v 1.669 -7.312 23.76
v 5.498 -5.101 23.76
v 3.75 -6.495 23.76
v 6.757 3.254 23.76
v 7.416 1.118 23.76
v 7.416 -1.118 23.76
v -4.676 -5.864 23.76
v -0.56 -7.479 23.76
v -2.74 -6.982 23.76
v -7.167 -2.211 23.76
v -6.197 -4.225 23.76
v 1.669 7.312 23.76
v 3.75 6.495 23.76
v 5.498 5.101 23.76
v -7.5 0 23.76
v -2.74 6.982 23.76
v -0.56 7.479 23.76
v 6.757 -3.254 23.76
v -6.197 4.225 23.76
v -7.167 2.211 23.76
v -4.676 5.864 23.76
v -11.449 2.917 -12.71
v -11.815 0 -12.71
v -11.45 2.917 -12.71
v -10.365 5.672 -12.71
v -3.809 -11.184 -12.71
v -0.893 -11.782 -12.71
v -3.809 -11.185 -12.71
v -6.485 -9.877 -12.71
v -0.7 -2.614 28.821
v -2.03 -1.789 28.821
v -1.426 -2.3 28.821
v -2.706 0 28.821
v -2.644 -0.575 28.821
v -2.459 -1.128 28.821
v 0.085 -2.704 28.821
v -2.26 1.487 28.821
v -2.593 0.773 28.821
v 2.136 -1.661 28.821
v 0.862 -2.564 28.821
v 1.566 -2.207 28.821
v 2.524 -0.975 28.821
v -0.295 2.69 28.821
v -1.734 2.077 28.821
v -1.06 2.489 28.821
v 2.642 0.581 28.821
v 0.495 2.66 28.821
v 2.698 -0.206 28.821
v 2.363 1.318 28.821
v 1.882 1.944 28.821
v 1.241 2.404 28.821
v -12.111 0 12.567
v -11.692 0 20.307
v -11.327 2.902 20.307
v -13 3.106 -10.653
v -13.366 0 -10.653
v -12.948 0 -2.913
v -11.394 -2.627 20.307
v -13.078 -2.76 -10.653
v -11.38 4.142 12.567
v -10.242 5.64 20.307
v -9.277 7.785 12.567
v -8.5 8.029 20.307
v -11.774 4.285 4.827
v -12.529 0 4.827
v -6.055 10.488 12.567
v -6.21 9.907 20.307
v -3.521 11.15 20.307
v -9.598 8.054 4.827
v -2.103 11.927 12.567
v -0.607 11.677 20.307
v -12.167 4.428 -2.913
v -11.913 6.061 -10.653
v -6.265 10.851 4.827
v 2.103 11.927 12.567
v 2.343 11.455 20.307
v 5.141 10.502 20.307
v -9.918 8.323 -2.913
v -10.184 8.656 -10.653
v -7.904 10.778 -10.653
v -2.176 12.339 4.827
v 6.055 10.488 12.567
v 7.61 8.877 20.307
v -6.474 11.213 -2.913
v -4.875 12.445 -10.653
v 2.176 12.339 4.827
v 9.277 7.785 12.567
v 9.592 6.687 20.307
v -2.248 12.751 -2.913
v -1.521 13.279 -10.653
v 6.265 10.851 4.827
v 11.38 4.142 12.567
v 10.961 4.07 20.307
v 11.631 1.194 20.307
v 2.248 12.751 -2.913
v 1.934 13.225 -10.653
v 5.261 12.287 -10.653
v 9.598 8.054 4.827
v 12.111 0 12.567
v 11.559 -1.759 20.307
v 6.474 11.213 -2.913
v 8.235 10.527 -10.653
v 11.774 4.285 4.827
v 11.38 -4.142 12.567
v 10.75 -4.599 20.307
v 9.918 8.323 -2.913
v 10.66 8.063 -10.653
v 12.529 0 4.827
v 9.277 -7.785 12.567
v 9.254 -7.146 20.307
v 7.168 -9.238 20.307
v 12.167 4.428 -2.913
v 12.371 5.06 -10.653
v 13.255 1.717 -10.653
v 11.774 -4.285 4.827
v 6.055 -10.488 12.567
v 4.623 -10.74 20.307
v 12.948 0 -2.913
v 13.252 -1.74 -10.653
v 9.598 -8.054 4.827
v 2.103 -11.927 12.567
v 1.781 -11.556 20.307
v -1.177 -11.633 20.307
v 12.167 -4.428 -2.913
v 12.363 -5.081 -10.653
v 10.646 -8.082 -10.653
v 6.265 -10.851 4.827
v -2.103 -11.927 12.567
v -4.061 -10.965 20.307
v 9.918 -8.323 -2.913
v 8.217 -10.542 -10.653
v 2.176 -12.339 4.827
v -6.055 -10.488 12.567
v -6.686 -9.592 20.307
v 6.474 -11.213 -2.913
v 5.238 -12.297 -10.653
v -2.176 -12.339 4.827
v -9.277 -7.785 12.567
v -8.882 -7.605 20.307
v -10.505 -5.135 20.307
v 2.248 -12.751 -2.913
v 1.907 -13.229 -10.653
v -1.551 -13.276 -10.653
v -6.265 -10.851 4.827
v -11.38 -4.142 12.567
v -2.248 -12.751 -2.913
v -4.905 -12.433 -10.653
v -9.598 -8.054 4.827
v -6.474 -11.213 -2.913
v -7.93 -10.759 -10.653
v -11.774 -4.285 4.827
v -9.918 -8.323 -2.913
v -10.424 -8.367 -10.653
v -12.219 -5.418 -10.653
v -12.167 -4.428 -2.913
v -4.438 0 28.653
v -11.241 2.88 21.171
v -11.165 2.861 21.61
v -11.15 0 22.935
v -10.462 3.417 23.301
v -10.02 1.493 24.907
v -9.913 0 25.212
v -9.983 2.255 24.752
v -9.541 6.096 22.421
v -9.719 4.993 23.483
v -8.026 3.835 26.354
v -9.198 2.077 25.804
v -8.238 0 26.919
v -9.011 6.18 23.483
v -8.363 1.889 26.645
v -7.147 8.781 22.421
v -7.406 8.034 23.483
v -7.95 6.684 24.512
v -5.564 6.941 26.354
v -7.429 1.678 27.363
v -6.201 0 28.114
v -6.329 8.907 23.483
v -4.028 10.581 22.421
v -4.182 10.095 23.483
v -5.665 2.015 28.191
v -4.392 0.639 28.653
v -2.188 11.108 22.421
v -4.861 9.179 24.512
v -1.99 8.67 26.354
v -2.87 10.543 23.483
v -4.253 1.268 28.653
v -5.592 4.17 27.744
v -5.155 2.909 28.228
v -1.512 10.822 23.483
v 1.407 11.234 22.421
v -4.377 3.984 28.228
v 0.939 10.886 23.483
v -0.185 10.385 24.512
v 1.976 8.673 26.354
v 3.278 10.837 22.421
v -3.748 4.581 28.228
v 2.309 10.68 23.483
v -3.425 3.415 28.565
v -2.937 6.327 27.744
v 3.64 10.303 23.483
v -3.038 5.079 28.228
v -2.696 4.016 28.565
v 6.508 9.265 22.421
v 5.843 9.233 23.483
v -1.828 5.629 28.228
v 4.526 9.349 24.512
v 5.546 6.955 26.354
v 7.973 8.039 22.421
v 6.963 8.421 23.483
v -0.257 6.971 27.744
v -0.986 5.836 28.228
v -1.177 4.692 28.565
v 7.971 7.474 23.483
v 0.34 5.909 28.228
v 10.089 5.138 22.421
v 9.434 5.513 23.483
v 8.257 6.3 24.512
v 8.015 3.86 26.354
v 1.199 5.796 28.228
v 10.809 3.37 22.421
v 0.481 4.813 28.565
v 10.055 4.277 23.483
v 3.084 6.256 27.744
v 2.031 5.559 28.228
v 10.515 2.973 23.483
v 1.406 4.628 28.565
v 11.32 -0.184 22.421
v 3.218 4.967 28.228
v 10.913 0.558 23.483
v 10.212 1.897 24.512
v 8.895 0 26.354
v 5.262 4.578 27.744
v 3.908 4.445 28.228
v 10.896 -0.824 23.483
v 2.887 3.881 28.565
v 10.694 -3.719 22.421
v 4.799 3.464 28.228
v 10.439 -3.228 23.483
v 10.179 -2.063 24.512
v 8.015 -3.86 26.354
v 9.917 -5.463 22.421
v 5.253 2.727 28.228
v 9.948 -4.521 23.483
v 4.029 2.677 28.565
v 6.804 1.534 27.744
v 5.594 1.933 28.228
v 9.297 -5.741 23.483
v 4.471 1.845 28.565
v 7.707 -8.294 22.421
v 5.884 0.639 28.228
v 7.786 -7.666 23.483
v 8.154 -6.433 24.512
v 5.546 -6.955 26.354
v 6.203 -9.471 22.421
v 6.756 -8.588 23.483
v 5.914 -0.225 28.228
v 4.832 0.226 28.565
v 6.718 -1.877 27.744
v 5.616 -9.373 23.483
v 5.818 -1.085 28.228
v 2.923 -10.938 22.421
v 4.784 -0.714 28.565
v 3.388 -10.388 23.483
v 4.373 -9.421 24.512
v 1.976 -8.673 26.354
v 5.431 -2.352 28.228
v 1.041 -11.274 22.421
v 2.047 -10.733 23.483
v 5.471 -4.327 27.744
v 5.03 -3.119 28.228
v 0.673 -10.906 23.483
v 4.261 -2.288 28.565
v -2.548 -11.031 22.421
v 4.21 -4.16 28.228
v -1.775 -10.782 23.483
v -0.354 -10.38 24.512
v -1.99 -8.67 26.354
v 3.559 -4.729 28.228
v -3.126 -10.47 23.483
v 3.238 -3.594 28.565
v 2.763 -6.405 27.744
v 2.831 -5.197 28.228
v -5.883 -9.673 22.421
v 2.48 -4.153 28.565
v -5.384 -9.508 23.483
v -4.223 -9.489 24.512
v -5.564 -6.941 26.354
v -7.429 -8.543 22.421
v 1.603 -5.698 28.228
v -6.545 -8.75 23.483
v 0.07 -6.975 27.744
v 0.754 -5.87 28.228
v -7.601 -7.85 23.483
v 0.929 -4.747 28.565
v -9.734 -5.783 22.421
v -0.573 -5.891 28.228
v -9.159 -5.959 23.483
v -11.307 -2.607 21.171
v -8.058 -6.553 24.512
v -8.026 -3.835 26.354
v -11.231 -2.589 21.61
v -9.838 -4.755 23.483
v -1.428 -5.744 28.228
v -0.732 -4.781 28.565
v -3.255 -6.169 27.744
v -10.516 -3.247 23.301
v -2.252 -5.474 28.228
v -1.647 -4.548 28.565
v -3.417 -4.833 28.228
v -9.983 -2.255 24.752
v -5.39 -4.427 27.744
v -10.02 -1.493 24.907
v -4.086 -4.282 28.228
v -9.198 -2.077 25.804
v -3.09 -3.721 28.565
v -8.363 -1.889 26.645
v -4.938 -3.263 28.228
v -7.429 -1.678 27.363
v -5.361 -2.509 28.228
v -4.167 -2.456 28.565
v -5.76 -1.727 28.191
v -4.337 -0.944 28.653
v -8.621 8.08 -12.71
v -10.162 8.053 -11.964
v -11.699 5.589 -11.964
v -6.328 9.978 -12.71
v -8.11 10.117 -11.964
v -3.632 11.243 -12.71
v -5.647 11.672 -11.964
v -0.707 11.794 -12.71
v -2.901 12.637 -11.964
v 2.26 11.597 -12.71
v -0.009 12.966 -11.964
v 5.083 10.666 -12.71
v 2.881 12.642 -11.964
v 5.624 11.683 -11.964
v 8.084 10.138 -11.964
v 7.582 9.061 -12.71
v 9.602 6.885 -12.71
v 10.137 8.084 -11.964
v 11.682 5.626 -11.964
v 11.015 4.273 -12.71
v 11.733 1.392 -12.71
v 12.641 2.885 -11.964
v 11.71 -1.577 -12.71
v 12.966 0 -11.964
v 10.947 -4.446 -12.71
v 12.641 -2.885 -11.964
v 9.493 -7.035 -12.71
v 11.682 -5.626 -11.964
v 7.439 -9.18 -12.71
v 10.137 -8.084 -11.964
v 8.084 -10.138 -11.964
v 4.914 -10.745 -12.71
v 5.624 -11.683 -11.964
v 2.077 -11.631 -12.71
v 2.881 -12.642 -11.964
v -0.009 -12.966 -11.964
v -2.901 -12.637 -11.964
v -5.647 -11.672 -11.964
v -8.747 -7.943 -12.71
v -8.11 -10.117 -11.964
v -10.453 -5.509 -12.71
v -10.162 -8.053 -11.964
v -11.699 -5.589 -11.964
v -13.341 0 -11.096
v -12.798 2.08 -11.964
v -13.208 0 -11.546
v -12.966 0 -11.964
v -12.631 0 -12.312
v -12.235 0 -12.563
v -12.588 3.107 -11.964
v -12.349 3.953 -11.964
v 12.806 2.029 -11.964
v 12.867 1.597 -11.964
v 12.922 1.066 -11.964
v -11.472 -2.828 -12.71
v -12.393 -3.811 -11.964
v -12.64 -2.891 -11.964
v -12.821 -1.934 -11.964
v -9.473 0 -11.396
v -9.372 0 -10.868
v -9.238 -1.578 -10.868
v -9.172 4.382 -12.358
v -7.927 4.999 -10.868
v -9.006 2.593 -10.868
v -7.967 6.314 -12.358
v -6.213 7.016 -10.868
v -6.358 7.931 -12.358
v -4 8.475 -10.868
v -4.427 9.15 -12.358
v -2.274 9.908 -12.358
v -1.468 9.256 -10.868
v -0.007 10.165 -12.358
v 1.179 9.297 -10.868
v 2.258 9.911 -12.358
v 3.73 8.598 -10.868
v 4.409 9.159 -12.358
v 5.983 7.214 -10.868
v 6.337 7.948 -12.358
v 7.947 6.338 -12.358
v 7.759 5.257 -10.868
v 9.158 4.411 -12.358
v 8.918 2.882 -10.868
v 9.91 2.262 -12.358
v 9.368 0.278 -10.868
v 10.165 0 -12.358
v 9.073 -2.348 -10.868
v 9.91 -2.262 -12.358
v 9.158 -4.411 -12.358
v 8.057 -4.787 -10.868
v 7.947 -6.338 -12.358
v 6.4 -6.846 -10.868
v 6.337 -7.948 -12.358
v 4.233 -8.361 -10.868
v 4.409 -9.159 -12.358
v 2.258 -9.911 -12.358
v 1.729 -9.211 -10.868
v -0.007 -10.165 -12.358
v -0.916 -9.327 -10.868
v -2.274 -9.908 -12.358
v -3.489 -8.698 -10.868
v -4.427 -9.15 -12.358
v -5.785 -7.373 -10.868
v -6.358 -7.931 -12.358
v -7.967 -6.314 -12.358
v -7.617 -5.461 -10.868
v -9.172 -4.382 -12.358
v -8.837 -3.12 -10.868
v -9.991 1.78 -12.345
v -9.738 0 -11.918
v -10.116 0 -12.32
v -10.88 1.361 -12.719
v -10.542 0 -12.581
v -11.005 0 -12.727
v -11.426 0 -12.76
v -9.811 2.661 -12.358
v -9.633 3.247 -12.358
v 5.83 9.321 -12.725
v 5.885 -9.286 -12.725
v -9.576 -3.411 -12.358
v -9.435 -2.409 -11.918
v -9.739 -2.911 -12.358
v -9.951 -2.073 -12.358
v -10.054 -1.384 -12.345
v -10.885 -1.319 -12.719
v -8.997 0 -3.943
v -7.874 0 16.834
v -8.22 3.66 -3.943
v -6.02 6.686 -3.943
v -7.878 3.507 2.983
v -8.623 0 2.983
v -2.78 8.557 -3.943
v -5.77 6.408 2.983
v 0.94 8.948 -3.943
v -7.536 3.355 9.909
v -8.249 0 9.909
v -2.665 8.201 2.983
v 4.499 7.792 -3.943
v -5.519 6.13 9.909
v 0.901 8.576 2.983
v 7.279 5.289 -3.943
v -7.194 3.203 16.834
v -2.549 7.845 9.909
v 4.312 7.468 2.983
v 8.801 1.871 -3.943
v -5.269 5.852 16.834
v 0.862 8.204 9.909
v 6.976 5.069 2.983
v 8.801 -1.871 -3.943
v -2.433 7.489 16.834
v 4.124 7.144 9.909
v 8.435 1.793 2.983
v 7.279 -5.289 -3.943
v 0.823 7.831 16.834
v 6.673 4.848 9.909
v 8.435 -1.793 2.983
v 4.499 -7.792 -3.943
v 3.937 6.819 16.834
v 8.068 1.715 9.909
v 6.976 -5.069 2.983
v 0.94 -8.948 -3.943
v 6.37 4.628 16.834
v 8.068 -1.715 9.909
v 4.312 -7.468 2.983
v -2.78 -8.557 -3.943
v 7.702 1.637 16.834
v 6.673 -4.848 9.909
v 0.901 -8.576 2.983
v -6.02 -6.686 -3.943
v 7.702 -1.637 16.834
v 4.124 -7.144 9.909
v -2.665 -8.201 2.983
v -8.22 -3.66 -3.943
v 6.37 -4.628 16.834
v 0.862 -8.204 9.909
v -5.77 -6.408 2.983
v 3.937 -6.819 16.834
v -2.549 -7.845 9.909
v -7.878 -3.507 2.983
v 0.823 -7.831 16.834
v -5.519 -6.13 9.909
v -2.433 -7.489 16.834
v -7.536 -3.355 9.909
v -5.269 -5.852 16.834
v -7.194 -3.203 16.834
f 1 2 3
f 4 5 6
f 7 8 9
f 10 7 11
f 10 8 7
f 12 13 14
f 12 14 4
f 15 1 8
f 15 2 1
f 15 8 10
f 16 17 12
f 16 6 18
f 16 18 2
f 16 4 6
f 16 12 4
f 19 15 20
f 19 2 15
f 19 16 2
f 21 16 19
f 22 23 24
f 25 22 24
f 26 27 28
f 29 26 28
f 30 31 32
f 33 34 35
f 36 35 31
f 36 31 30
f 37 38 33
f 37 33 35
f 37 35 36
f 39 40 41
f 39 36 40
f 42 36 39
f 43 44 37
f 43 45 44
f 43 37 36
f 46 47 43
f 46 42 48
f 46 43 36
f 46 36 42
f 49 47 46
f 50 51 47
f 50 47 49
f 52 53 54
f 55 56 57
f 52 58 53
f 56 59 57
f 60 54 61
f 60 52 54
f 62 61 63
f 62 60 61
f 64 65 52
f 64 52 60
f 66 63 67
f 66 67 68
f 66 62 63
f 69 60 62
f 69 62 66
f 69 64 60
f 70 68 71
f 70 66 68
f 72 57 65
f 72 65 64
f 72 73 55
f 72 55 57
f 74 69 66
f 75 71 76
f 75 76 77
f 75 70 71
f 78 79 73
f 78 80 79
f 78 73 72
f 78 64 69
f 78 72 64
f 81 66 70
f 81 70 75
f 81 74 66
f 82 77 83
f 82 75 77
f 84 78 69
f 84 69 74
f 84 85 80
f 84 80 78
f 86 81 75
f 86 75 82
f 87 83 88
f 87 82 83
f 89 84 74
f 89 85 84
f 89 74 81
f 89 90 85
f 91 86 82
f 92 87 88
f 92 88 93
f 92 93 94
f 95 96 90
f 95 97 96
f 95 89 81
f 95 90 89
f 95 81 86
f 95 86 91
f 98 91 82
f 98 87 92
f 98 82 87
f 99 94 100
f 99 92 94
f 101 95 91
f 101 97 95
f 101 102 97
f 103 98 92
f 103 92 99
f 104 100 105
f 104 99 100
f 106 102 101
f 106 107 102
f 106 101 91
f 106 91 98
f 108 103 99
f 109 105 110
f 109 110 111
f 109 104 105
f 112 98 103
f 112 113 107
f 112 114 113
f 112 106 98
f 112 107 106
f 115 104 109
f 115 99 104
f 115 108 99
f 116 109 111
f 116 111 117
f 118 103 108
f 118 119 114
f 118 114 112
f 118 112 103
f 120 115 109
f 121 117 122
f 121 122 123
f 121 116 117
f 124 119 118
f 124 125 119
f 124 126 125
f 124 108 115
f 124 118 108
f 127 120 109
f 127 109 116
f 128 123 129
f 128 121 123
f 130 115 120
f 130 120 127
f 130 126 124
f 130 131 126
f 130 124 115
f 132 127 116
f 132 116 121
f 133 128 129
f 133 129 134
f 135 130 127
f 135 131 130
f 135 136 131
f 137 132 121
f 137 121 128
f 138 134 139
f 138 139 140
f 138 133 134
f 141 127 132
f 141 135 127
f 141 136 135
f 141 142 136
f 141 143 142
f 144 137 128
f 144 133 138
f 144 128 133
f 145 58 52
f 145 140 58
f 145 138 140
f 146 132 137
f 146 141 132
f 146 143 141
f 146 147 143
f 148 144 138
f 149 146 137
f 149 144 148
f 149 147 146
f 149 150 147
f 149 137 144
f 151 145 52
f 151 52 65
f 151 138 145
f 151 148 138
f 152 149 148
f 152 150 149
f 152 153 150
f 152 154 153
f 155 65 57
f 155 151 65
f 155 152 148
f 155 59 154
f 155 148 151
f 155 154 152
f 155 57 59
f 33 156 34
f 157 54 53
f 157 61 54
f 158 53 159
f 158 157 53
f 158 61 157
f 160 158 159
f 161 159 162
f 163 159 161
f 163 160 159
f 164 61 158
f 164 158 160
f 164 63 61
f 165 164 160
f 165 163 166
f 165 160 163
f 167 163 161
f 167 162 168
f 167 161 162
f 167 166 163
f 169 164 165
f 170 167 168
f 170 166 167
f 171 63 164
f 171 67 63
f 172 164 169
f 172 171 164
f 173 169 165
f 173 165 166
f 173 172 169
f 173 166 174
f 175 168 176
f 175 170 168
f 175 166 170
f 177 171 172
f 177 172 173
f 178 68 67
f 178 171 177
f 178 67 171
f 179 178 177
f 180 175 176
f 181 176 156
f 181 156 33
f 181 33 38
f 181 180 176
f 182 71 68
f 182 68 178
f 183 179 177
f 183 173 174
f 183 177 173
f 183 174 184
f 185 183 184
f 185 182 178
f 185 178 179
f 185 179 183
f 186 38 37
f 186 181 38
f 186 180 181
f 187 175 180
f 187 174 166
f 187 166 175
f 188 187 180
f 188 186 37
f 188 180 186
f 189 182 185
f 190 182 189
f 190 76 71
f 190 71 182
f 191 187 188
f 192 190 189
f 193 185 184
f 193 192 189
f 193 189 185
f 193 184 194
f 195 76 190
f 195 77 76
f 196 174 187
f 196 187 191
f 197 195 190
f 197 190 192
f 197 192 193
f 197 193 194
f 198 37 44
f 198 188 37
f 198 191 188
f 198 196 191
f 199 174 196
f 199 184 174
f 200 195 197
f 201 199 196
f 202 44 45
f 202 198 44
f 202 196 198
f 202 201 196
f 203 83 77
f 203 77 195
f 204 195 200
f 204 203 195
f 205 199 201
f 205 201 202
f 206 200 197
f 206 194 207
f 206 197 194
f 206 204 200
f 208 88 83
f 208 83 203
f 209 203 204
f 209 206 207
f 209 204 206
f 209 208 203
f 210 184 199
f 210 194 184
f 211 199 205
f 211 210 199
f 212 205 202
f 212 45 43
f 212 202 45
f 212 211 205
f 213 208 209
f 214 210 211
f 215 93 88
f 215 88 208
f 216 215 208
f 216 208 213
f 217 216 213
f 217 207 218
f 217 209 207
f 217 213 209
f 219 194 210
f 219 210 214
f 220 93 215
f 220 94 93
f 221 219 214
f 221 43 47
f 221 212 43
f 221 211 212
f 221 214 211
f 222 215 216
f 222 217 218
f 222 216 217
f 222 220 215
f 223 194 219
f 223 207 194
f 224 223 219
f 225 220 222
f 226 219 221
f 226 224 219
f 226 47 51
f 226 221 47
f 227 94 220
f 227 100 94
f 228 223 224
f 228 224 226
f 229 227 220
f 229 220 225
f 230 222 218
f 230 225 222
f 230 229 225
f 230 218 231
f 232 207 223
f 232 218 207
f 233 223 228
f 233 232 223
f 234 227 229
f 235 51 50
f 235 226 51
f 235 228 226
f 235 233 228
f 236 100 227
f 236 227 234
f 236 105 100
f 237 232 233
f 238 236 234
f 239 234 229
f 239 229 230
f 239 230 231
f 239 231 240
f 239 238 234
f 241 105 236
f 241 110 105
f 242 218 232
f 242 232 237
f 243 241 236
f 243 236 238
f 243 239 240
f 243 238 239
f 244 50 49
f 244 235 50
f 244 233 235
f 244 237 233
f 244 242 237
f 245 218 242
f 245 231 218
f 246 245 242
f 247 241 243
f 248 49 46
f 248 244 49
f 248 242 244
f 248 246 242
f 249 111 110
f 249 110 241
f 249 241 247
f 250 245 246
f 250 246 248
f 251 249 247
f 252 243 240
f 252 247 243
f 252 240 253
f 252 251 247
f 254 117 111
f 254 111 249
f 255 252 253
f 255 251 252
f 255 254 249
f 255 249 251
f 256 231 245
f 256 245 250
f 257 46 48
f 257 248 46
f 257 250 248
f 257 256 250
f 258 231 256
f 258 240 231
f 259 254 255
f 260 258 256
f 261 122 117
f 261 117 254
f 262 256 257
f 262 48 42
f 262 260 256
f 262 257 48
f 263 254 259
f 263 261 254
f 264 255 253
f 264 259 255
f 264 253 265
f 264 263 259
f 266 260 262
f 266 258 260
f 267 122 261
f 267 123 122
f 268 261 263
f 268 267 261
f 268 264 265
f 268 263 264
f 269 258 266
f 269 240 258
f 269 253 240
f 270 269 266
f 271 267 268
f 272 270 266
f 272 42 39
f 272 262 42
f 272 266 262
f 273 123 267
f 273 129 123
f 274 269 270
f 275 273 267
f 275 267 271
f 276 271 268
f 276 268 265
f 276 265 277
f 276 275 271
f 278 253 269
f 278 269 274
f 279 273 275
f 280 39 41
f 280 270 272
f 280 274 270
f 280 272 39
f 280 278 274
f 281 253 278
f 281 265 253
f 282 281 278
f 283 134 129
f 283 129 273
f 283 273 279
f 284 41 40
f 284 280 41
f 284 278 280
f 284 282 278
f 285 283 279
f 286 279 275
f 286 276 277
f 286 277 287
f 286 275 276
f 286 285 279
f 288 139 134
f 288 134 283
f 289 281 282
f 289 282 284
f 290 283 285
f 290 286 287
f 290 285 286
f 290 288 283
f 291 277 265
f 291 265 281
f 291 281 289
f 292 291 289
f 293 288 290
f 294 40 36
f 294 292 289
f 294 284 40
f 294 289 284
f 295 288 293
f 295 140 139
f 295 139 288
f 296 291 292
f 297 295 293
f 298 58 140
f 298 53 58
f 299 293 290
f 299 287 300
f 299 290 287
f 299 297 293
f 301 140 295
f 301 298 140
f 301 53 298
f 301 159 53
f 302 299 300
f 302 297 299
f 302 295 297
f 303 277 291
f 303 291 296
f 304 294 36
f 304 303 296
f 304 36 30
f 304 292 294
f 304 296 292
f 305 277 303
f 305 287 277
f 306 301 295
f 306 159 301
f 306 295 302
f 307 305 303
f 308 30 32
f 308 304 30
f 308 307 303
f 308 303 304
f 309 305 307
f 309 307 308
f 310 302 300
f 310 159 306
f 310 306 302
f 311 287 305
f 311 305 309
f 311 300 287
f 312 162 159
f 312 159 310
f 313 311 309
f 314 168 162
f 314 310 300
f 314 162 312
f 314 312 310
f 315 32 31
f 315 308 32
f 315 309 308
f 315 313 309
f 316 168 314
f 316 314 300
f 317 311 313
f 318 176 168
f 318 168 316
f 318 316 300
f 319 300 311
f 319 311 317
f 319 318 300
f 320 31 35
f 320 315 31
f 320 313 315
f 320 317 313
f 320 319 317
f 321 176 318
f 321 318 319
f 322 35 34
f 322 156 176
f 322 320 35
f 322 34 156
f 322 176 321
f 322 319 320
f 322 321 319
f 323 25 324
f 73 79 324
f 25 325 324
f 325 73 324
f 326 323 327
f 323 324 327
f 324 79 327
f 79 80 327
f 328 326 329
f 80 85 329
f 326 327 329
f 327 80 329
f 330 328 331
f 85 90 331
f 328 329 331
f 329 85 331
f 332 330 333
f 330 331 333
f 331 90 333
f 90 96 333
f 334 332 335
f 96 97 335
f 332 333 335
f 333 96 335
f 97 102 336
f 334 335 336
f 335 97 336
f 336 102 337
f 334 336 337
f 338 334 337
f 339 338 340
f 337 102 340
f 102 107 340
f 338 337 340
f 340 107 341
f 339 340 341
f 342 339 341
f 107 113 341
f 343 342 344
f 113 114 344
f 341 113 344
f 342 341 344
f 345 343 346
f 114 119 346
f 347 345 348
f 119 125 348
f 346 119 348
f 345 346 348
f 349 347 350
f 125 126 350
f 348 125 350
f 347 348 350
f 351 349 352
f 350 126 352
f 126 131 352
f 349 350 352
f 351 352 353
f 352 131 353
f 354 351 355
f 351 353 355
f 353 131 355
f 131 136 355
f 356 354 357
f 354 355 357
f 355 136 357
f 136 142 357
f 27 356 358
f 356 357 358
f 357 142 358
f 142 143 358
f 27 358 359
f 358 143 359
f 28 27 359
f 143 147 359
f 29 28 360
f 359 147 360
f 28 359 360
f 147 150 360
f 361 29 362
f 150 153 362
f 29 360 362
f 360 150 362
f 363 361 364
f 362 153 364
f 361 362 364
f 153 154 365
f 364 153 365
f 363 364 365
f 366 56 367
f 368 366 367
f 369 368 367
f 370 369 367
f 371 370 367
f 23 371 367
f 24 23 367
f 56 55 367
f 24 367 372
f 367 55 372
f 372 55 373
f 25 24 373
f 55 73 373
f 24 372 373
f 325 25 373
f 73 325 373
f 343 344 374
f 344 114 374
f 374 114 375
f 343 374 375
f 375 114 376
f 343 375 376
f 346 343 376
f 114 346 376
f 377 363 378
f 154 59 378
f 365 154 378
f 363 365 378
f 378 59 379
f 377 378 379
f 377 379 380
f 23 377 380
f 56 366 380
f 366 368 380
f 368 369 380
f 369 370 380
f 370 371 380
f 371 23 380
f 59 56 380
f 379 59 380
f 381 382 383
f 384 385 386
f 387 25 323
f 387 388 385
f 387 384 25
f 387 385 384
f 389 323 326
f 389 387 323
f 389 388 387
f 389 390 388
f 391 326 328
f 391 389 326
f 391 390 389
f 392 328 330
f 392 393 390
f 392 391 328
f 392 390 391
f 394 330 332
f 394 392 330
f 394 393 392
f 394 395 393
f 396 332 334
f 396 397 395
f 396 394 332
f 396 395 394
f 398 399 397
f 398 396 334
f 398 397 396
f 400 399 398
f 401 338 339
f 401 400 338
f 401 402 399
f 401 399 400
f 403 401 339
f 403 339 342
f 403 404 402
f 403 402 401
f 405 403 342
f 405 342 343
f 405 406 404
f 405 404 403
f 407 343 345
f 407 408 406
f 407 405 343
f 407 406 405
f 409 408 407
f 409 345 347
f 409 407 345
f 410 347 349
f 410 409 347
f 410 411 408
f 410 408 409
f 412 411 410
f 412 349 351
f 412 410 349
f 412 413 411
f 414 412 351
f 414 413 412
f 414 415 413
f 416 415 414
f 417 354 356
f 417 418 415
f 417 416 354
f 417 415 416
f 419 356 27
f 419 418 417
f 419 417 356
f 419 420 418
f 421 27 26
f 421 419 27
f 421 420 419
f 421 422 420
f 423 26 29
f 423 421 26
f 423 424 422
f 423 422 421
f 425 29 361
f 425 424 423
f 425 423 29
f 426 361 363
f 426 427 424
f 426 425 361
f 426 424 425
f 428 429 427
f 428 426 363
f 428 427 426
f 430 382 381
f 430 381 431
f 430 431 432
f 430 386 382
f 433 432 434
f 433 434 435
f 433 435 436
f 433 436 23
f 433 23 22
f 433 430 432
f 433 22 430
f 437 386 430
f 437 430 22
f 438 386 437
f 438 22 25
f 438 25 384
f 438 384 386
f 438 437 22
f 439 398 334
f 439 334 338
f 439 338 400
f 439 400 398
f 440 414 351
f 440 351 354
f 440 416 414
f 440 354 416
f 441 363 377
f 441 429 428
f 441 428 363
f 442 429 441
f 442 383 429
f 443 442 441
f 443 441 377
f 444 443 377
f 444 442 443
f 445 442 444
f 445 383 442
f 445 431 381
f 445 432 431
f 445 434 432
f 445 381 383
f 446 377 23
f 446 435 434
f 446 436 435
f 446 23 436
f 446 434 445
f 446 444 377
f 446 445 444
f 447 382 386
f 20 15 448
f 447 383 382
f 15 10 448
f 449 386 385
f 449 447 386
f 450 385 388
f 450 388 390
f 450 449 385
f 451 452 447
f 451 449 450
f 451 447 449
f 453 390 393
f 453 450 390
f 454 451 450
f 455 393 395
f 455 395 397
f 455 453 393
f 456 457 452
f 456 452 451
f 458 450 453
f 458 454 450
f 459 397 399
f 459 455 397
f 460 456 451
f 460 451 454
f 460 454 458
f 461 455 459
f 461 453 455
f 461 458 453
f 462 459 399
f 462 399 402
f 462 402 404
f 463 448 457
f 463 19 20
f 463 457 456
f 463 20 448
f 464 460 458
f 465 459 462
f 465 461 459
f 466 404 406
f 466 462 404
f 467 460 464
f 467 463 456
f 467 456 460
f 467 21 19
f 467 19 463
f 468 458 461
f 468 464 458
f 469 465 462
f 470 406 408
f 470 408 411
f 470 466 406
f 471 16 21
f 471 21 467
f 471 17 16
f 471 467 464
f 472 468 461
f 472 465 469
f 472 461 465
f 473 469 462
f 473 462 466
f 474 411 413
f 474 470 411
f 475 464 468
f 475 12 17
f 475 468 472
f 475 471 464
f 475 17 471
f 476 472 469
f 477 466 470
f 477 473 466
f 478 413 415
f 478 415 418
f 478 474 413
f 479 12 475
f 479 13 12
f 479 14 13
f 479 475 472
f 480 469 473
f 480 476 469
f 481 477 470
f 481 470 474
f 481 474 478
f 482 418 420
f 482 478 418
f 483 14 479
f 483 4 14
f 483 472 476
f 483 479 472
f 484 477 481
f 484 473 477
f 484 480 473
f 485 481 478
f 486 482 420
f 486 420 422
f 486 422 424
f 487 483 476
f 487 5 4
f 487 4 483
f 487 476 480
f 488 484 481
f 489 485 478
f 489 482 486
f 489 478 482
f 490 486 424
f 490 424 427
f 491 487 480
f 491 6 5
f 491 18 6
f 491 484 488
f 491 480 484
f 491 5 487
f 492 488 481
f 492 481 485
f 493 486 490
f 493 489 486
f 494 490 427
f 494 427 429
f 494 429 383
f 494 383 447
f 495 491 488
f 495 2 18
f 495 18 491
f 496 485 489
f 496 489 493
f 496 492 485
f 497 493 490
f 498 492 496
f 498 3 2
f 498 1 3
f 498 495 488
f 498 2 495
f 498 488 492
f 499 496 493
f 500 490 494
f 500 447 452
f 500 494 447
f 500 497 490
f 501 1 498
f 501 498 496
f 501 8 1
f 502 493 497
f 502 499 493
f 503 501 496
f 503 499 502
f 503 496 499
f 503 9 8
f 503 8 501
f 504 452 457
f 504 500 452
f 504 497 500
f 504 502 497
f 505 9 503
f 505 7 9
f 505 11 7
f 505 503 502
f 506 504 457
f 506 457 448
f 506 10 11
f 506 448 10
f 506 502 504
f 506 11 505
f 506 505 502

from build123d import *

# Parameters (mm, degrees)
F2_R = 1.99999
F3_R = 9


# Not quite as in the source:
# - a fillet or chamfer is up to 0.001 mm smaller than in the source, because OpenCascade refuses the exact size


with BuildPart() as f1:
    # F0 (on Front) → F1 (revolve)
    with BuildSketch(Plane.XZ):
        Polygon((-9.5, -13.2402114049), (-7.5, 23.7597885951), (0, 23.7597885951), (0, 28.8208965212), (-11.5044763215, 28.8208965212), (-11.5044763215, 23.7850059011), (-13.4568578627, -12.3340526108), align=None)
    revolve(axis=Axis((0, 0, 3.3093634993), (0, 0, -1)))

    # F2 (radius 2 in the source; OpenCascade refuses exactly that, so slightly less here)
    f2_edges = [f1.edges().sort_by_distance(p)[0] for p in [
        (9.5, 0, -13.240211),
        (13.456858, 0, -12.334053),
    ]]
    fillet(f2_edges, radius=F2_R)

    # F3
    f3_edges = [f1.edges().sort_by_distance(p)[0] for p in [
        (11.504476, 0, 28.820897),
    ]]
    fillet(f3_edges, radius=F3_R)


solid = f1.part
